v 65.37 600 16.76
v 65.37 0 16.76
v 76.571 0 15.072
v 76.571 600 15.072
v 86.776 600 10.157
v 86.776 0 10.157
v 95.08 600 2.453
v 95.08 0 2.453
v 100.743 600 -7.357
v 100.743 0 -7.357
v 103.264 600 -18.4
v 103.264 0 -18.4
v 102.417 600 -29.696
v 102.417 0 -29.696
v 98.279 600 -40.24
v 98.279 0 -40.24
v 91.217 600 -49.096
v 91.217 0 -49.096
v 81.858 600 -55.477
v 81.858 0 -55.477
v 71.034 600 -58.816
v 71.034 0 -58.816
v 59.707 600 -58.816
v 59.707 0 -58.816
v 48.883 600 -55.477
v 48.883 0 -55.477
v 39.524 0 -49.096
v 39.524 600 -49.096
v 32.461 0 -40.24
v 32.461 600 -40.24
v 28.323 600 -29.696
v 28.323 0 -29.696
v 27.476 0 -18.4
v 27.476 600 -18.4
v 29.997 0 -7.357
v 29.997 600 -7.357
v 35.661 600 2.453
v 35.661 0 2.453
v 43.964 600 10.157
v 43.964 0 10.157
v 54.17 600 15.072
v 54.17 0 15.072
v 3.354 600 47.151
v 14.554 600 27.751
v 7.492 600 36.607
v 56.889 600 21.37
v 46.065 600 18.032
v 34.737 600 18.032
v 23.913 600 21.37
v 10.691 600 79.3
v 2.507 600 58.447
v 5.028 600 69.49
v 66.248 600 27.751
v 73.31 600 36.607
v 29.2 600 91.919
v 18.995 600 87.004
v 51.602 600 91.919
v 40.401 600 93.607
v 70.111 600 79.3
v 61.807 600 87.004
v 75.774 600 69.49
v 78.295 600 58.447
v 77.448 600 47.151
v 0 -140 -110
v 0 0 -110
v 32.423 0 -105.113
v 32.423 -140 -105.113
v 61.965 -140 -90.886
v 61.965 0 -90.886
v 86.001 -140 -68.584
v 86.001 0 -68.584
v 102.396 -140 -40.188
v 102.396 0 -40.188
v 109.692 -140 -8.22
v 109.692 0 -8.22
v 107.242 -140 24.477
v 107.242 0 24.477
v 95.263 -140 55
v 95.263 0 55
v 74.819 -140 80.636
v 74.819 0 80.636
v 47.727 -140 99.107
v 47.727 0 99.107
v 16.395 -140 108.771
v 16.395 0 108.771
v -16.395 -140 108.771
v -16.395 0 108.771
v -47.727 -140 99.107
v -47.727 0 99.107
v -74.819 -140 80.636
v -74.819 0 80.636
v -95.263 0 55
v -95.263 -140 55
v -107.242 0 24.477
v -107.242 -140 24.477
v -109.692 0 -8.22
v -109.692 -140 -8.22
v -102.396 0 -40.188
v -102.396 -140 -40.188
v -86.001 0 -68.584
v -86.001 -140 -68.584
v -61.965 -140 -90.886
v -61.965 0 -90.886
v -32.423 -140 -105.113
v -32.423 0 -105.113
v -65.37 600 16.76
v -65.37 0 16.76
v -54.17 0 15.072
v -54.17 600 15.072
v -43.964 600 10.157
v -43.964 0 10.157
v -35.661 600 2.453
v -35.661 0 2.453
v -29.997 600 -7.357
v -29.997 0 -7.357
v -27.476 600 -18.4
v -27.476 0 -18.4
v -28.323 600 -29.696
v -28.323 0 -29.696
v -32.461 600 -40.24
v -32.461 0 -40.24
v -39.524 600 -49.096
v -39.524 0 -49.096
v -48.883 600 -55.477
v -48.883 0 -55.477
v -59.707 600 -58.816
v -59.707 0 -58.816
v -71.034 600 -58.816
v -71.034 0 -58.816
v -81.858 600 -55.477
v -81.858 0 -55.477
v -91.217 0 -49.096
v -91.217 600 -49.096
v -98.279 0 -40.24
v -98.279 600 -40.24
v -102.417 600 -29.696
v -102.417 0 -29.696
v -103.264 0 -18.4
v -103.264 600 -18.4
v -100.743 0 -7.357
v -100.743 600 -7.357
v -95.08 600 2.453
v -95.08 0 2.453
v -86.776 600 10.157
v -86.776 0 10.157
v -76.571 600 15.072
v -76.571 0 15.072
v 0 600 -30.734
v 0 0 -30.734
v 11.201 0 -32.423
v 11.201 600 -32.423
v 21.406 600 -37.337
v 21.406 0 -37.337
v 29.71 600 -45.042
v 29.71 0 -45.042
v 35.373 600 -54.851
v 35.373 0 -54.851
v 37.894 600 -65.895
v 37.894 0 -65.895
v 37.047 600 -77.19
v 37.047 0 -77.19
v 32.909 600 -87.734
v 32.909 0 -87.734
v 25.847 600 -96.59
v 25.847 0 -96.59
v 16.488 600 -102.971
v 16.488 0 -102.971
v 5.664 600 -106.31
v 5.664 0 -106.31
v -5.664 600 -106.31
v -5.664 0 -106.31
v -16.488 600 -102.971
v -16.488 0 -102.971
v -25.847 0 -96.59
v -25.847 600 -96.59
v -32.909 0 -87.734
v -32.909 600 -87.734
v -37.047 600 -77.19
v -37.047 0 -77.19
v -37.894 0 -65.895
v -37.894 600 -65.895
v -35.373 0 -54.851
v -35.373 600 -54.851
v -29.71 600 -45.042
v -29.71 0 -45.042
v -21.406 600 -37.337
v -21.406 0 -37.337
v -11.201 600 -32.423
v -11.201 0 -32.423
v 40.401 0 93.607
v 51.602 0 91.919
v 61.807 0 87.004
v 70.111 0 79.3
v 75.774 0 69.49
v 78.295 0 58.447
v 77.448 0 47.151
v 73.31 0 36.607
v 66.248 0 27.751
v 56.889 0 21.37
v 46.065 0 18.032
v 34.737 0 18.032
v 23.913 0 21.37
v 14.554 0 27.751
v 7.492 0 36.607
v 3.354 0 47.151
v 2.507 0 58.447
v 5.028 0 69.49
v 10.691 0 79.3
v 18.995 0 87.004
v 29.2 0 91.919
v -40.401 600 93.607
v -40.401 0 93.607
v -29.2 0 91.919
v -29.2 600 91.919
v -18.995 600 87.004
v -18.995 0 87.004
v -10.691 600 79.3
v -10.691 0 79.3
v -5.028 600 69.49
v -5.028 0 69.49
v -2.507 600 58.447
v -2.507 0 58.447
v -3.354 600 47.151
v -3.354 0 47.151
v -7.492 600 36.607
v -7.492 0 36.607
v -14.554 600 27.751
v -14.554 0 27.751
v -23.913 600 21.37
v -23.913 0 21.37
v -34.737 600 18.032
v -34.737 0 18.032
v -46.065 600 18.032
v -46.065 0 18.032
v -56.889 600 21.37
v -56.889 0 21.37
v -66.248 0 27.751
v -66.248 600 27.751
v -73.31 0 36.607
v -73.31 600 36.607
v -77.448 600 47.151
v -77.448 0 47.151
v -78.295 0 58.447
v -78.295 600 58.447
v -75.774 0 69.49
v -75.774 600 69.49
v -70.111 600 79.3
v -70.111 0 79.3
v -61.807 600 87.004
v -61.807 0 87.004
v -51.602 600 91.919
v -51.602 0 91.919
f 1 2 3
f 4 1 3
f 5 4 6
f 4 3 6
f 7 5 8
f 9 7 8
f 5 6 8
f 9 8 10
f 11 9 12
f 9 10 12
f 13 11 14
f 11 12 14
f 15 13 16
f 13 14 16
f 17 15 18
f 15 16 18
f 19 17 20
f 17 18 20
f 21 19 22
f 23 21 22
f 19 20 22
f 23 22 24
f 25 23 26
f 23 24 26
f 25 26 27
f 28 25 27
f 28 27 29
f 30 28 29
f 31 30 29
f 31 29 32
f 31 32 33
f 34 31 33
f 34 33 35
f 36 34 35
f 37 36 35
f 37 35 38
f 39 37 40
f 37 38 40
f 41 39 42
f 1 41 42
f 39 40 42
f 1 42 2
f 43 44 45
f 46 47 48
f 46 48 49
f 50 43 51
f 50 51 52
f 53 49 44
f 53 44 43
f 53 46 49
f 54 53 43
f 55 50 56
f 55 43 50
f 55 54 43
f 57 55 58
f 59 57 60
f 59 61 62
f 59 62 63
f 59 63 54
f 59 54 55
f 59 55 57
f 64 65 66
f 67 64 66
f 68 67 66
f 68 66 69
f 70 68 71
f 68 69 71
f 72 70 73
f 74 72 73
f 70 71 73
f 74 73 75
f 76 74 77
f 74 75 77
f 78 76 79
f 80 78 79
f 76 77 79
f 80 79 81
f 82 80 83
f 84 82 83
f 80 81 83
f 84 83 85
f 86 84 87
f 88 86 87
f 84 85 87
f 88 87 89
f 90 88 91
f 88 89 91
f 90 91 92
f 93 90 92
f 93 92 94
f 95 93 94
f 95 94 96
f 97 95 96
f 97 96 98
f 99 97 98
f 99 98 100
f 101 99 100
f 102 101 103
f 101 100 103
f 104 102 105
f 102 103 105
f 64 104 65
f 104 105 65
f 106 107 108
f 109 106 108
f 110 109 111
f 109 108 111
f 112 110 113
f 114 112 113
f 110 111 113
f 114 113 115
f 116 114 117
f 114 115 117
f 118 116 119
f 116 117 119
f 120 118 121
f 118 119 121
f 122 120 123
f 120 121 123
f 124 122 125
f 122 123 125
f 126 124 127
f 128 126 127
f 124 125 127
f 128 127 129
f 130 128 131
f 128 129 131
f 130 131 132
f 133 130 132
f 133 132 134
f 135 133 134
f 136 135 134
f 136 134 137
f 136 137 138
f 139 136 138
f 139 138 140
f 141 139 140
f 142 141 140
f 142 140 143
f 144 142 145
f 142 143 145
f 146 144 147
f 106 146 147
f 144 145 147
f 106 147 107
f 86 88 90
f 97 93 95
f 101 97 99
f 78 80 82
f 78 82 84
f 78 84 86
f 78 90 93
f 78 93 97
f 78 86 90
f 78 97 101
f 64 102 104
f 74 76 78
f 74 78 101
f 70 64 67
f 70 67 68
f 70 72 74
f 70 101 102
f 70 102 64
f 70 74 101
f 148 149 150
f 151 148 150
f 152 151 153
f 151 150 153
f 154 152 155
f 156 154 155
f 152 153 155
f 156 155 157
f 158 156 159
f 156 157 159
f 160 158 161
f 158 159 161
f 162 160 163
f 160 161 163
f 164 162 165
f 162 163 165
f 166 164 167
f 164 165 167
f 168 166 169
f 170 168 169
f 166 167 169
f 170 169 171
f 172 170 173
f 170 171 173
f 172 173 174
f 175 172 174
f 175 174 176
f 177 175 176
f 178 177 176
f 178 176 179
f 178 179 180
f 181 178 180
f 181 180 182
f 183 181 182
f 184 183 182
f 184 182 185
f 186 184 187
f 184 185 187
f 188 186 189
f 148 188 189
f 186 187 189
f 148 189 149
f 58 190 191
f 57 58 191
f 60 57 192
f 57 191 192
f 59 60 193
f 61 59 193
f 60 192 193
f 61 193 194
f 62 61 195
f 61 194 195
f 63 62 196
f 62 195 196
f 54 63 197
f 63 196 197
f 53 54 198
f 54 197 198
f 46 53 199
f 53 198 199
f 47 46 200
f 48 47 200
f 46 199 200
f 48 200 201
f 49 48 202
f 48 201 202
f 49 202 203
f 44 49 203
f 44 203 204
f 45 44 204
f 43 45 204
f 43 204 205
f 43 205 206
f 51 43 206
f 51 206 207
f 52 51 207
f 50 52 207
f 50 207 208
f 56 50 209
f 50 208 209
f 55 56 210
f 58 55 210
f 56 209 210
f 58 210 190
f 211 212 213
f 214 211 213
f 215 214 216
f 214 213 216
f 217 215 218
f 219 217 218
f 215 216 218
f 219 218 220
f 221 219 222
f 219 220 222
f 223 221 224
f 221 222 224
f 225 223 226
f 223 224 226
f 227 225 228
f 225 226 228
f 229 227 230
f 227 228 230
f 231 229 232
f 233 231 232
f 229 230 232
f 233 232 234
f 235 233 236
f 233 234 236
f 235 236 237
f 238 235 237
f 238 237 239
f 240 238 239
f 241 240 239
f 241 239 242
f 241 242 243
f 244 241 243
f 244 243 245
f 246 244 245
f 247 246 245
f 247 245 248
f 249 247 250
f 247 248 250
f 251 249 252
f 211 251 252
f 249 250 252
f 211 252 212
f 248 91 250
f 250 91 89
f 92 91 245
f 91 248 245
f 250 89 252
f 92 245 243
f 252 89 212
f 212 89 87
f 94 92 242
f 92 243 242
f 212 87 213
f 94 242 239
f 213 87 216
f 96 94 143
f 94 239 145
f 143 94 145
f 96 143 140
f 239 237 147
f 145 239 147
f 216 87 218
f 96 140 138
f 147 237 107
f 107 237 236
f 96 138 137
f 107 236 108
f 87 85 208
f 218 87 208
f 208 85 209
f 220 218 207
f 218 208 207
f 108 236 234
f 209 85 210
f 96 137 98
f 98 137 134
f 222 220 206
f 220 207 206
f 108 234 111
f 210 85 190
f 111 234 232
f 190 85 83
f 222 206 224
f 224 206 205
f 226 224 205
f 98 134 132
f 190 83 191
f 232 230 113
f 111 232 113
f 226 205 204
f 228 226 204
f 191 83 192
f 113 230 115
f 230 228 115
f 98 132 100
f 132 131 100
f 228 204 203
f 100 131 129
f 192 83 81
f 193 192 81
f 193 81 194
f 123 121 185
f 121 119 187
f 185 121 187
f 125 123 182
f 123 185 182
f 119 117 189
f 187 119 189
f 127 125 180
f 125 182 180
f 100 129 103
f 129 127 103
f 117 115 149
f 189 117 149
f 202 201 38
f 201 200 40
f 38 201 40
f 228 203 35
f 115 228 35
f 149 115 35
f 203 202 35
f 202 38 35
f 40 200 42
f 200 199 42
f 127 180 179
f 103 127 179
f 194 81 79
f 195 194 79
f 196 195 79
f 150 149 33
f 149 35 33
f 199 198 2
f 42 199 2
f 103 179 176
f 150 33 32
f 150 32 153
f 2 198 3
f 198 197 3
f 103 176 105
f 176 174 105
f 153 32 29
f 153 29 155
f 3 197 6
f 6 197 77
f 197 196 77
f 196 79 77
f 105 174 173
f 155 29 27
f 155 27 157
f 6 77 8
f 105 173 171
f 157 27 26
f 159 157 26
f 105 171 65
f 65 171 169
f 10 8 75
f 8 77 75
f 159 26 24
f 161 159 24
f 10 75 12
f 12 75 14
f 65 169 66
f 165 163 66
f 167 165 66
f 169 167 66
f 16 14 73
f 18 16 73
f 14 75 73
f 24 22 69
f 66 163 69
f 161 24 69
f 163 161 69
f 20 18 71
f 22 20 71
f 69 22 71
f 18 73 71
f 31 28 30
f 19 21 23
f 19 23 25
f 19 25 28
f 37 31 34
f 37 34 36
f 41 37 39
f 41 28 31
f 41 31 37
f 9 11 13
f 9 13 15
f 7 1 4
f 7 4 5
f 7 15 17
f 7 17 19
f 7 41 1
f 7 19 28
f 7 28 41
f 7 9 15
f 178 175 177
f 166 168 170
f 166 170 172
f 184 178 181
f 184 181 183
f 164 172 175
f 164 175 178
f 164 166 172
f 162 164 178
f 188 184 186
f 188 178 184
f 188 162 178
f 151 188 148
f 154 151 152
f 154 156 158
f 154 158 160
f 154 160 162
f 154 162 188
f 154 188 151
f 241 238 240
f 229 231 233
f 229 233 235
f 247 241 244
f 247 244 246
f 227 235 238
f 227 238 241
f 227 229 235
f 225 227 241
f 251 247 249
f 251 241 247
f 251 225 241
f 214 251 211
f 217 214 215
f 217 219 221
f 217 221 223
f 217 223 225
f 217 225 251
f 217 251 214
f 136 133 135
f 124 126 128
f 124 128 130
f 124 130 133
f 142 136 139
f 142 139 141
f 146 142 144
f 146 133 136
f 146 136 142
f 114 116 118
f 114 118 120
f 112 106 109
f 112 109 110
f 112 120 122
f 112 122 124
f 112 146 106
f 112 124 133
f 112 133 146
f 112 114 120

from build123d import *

# Parameters (mm, degrees)
SKETCH1_R             = 38
BOSS_EXTRUDE1_DEPTH   = 600
BOSS_EXTRUDE1_2_DEPTH = 600
BOSS_EXTRUDE1_3_DEPTH = 600
BOSS_EXTRUDE1_4_DEPTH = 600
BOSS_EXTRUDE1_5_DEPTH = 600
SKETCH2_R             = 110
BOSS_EXTRUDE2_DEPTH   = 140


with BuildPart() as part:
    # Sketch1 → Boss-Extrude1 (new body)
    with BuildSketch(Plane(origin=(0, 0, 0), x_dir=(1, 0, 0), z_dir=(0, 1, 0))):
        with Locations(Location((65.370232552, 21.240076103, 0), (0, 0, 270))):
            Circle(SKETCH1_R)
    extrude(amount=BOSS_EXTRUDE1_DEPTH)



with BuildPart() as body_2:
    # Sketch1 → Boss-Extrude1 2 (new body)
    with BuildSketch(Plane(origin=(0, 0, 0), x_dir=(1, 0, 0), z_dir=(0, 1, 0))):
        with Locations(Location((40.401025569, -55.607241162, 0), (0, 0, 270))):
            Circle(SKETCH1_R)
    extrude(amount=BOSS_EXTRUDE1_2_DEPTH)


with BuildPart() as body_3:
    # Sketch1 → Boss-Extrude1 3 (new body)
    with BuildSketch(Plane(origin=(0, 0, 0), x_dir=(1, 0, 0), z_dir=(0, 1, 0))):
        with Locations(Location((-40.401025569, -55.607241162, 0), (0, 0, 270))):
            Circle(SKETCH1_R)
    extrude(amount=BOSS_EXTRUDE1_3_DEPTH)


with BuildPart() as body_4:
    # Sketch1 → Boss-Extrude1 4 (new body)
    with BuildSketch(Plane(origin=(0, 0, 0), x_dir=(1, 0, 0), z_dir=(0, 1, 0))):
        with Locations(Location((-65.370232552, 21.240076103, 0), (0, 0, 270))):
            Circle(SKETCH1_R)
    extrude(amount=BOSS_EXTRUDE1_4_DEPTH)


with BuildPart() as body_5:
    # Sketch1 → Boss-Extrude1 5 (new body)
    with BuildSketch(Plane(origin=(0, 0, 0), x_dir=(1, 0, 0), z_dir=(0, 1, 0))):
        with Locations(Location((0, 68.734330118, 0), (0, 0, 270))):
            Circle(SKETCH1_R)
    extrude(amount=BOSS_EXTRUDE1_5_DEPTH)


with BuildPart() as part_1:
    add(part.part)

    add(body_2.part)  # Boss-Extrude2 merges body 2

    add(body_3.part)  # Boss-Extrude2 merges body 3

    add(body_4.part)  # Boss-Extrude2 merges body 4

    add(body_5.part)  # Boss-Extrude2 merges body 5
    # Sketch2 → Boss-Extrude2 (add)
    with BuildSketch(Plane.XZ):
        with Locations(Location((0, 0, 0), (0, 0, 270))):
            Circle(SKETCH2_R)
    extrude(amount=BOSS_EXTRUDE2_DEPTH)


solid = part_1.part
